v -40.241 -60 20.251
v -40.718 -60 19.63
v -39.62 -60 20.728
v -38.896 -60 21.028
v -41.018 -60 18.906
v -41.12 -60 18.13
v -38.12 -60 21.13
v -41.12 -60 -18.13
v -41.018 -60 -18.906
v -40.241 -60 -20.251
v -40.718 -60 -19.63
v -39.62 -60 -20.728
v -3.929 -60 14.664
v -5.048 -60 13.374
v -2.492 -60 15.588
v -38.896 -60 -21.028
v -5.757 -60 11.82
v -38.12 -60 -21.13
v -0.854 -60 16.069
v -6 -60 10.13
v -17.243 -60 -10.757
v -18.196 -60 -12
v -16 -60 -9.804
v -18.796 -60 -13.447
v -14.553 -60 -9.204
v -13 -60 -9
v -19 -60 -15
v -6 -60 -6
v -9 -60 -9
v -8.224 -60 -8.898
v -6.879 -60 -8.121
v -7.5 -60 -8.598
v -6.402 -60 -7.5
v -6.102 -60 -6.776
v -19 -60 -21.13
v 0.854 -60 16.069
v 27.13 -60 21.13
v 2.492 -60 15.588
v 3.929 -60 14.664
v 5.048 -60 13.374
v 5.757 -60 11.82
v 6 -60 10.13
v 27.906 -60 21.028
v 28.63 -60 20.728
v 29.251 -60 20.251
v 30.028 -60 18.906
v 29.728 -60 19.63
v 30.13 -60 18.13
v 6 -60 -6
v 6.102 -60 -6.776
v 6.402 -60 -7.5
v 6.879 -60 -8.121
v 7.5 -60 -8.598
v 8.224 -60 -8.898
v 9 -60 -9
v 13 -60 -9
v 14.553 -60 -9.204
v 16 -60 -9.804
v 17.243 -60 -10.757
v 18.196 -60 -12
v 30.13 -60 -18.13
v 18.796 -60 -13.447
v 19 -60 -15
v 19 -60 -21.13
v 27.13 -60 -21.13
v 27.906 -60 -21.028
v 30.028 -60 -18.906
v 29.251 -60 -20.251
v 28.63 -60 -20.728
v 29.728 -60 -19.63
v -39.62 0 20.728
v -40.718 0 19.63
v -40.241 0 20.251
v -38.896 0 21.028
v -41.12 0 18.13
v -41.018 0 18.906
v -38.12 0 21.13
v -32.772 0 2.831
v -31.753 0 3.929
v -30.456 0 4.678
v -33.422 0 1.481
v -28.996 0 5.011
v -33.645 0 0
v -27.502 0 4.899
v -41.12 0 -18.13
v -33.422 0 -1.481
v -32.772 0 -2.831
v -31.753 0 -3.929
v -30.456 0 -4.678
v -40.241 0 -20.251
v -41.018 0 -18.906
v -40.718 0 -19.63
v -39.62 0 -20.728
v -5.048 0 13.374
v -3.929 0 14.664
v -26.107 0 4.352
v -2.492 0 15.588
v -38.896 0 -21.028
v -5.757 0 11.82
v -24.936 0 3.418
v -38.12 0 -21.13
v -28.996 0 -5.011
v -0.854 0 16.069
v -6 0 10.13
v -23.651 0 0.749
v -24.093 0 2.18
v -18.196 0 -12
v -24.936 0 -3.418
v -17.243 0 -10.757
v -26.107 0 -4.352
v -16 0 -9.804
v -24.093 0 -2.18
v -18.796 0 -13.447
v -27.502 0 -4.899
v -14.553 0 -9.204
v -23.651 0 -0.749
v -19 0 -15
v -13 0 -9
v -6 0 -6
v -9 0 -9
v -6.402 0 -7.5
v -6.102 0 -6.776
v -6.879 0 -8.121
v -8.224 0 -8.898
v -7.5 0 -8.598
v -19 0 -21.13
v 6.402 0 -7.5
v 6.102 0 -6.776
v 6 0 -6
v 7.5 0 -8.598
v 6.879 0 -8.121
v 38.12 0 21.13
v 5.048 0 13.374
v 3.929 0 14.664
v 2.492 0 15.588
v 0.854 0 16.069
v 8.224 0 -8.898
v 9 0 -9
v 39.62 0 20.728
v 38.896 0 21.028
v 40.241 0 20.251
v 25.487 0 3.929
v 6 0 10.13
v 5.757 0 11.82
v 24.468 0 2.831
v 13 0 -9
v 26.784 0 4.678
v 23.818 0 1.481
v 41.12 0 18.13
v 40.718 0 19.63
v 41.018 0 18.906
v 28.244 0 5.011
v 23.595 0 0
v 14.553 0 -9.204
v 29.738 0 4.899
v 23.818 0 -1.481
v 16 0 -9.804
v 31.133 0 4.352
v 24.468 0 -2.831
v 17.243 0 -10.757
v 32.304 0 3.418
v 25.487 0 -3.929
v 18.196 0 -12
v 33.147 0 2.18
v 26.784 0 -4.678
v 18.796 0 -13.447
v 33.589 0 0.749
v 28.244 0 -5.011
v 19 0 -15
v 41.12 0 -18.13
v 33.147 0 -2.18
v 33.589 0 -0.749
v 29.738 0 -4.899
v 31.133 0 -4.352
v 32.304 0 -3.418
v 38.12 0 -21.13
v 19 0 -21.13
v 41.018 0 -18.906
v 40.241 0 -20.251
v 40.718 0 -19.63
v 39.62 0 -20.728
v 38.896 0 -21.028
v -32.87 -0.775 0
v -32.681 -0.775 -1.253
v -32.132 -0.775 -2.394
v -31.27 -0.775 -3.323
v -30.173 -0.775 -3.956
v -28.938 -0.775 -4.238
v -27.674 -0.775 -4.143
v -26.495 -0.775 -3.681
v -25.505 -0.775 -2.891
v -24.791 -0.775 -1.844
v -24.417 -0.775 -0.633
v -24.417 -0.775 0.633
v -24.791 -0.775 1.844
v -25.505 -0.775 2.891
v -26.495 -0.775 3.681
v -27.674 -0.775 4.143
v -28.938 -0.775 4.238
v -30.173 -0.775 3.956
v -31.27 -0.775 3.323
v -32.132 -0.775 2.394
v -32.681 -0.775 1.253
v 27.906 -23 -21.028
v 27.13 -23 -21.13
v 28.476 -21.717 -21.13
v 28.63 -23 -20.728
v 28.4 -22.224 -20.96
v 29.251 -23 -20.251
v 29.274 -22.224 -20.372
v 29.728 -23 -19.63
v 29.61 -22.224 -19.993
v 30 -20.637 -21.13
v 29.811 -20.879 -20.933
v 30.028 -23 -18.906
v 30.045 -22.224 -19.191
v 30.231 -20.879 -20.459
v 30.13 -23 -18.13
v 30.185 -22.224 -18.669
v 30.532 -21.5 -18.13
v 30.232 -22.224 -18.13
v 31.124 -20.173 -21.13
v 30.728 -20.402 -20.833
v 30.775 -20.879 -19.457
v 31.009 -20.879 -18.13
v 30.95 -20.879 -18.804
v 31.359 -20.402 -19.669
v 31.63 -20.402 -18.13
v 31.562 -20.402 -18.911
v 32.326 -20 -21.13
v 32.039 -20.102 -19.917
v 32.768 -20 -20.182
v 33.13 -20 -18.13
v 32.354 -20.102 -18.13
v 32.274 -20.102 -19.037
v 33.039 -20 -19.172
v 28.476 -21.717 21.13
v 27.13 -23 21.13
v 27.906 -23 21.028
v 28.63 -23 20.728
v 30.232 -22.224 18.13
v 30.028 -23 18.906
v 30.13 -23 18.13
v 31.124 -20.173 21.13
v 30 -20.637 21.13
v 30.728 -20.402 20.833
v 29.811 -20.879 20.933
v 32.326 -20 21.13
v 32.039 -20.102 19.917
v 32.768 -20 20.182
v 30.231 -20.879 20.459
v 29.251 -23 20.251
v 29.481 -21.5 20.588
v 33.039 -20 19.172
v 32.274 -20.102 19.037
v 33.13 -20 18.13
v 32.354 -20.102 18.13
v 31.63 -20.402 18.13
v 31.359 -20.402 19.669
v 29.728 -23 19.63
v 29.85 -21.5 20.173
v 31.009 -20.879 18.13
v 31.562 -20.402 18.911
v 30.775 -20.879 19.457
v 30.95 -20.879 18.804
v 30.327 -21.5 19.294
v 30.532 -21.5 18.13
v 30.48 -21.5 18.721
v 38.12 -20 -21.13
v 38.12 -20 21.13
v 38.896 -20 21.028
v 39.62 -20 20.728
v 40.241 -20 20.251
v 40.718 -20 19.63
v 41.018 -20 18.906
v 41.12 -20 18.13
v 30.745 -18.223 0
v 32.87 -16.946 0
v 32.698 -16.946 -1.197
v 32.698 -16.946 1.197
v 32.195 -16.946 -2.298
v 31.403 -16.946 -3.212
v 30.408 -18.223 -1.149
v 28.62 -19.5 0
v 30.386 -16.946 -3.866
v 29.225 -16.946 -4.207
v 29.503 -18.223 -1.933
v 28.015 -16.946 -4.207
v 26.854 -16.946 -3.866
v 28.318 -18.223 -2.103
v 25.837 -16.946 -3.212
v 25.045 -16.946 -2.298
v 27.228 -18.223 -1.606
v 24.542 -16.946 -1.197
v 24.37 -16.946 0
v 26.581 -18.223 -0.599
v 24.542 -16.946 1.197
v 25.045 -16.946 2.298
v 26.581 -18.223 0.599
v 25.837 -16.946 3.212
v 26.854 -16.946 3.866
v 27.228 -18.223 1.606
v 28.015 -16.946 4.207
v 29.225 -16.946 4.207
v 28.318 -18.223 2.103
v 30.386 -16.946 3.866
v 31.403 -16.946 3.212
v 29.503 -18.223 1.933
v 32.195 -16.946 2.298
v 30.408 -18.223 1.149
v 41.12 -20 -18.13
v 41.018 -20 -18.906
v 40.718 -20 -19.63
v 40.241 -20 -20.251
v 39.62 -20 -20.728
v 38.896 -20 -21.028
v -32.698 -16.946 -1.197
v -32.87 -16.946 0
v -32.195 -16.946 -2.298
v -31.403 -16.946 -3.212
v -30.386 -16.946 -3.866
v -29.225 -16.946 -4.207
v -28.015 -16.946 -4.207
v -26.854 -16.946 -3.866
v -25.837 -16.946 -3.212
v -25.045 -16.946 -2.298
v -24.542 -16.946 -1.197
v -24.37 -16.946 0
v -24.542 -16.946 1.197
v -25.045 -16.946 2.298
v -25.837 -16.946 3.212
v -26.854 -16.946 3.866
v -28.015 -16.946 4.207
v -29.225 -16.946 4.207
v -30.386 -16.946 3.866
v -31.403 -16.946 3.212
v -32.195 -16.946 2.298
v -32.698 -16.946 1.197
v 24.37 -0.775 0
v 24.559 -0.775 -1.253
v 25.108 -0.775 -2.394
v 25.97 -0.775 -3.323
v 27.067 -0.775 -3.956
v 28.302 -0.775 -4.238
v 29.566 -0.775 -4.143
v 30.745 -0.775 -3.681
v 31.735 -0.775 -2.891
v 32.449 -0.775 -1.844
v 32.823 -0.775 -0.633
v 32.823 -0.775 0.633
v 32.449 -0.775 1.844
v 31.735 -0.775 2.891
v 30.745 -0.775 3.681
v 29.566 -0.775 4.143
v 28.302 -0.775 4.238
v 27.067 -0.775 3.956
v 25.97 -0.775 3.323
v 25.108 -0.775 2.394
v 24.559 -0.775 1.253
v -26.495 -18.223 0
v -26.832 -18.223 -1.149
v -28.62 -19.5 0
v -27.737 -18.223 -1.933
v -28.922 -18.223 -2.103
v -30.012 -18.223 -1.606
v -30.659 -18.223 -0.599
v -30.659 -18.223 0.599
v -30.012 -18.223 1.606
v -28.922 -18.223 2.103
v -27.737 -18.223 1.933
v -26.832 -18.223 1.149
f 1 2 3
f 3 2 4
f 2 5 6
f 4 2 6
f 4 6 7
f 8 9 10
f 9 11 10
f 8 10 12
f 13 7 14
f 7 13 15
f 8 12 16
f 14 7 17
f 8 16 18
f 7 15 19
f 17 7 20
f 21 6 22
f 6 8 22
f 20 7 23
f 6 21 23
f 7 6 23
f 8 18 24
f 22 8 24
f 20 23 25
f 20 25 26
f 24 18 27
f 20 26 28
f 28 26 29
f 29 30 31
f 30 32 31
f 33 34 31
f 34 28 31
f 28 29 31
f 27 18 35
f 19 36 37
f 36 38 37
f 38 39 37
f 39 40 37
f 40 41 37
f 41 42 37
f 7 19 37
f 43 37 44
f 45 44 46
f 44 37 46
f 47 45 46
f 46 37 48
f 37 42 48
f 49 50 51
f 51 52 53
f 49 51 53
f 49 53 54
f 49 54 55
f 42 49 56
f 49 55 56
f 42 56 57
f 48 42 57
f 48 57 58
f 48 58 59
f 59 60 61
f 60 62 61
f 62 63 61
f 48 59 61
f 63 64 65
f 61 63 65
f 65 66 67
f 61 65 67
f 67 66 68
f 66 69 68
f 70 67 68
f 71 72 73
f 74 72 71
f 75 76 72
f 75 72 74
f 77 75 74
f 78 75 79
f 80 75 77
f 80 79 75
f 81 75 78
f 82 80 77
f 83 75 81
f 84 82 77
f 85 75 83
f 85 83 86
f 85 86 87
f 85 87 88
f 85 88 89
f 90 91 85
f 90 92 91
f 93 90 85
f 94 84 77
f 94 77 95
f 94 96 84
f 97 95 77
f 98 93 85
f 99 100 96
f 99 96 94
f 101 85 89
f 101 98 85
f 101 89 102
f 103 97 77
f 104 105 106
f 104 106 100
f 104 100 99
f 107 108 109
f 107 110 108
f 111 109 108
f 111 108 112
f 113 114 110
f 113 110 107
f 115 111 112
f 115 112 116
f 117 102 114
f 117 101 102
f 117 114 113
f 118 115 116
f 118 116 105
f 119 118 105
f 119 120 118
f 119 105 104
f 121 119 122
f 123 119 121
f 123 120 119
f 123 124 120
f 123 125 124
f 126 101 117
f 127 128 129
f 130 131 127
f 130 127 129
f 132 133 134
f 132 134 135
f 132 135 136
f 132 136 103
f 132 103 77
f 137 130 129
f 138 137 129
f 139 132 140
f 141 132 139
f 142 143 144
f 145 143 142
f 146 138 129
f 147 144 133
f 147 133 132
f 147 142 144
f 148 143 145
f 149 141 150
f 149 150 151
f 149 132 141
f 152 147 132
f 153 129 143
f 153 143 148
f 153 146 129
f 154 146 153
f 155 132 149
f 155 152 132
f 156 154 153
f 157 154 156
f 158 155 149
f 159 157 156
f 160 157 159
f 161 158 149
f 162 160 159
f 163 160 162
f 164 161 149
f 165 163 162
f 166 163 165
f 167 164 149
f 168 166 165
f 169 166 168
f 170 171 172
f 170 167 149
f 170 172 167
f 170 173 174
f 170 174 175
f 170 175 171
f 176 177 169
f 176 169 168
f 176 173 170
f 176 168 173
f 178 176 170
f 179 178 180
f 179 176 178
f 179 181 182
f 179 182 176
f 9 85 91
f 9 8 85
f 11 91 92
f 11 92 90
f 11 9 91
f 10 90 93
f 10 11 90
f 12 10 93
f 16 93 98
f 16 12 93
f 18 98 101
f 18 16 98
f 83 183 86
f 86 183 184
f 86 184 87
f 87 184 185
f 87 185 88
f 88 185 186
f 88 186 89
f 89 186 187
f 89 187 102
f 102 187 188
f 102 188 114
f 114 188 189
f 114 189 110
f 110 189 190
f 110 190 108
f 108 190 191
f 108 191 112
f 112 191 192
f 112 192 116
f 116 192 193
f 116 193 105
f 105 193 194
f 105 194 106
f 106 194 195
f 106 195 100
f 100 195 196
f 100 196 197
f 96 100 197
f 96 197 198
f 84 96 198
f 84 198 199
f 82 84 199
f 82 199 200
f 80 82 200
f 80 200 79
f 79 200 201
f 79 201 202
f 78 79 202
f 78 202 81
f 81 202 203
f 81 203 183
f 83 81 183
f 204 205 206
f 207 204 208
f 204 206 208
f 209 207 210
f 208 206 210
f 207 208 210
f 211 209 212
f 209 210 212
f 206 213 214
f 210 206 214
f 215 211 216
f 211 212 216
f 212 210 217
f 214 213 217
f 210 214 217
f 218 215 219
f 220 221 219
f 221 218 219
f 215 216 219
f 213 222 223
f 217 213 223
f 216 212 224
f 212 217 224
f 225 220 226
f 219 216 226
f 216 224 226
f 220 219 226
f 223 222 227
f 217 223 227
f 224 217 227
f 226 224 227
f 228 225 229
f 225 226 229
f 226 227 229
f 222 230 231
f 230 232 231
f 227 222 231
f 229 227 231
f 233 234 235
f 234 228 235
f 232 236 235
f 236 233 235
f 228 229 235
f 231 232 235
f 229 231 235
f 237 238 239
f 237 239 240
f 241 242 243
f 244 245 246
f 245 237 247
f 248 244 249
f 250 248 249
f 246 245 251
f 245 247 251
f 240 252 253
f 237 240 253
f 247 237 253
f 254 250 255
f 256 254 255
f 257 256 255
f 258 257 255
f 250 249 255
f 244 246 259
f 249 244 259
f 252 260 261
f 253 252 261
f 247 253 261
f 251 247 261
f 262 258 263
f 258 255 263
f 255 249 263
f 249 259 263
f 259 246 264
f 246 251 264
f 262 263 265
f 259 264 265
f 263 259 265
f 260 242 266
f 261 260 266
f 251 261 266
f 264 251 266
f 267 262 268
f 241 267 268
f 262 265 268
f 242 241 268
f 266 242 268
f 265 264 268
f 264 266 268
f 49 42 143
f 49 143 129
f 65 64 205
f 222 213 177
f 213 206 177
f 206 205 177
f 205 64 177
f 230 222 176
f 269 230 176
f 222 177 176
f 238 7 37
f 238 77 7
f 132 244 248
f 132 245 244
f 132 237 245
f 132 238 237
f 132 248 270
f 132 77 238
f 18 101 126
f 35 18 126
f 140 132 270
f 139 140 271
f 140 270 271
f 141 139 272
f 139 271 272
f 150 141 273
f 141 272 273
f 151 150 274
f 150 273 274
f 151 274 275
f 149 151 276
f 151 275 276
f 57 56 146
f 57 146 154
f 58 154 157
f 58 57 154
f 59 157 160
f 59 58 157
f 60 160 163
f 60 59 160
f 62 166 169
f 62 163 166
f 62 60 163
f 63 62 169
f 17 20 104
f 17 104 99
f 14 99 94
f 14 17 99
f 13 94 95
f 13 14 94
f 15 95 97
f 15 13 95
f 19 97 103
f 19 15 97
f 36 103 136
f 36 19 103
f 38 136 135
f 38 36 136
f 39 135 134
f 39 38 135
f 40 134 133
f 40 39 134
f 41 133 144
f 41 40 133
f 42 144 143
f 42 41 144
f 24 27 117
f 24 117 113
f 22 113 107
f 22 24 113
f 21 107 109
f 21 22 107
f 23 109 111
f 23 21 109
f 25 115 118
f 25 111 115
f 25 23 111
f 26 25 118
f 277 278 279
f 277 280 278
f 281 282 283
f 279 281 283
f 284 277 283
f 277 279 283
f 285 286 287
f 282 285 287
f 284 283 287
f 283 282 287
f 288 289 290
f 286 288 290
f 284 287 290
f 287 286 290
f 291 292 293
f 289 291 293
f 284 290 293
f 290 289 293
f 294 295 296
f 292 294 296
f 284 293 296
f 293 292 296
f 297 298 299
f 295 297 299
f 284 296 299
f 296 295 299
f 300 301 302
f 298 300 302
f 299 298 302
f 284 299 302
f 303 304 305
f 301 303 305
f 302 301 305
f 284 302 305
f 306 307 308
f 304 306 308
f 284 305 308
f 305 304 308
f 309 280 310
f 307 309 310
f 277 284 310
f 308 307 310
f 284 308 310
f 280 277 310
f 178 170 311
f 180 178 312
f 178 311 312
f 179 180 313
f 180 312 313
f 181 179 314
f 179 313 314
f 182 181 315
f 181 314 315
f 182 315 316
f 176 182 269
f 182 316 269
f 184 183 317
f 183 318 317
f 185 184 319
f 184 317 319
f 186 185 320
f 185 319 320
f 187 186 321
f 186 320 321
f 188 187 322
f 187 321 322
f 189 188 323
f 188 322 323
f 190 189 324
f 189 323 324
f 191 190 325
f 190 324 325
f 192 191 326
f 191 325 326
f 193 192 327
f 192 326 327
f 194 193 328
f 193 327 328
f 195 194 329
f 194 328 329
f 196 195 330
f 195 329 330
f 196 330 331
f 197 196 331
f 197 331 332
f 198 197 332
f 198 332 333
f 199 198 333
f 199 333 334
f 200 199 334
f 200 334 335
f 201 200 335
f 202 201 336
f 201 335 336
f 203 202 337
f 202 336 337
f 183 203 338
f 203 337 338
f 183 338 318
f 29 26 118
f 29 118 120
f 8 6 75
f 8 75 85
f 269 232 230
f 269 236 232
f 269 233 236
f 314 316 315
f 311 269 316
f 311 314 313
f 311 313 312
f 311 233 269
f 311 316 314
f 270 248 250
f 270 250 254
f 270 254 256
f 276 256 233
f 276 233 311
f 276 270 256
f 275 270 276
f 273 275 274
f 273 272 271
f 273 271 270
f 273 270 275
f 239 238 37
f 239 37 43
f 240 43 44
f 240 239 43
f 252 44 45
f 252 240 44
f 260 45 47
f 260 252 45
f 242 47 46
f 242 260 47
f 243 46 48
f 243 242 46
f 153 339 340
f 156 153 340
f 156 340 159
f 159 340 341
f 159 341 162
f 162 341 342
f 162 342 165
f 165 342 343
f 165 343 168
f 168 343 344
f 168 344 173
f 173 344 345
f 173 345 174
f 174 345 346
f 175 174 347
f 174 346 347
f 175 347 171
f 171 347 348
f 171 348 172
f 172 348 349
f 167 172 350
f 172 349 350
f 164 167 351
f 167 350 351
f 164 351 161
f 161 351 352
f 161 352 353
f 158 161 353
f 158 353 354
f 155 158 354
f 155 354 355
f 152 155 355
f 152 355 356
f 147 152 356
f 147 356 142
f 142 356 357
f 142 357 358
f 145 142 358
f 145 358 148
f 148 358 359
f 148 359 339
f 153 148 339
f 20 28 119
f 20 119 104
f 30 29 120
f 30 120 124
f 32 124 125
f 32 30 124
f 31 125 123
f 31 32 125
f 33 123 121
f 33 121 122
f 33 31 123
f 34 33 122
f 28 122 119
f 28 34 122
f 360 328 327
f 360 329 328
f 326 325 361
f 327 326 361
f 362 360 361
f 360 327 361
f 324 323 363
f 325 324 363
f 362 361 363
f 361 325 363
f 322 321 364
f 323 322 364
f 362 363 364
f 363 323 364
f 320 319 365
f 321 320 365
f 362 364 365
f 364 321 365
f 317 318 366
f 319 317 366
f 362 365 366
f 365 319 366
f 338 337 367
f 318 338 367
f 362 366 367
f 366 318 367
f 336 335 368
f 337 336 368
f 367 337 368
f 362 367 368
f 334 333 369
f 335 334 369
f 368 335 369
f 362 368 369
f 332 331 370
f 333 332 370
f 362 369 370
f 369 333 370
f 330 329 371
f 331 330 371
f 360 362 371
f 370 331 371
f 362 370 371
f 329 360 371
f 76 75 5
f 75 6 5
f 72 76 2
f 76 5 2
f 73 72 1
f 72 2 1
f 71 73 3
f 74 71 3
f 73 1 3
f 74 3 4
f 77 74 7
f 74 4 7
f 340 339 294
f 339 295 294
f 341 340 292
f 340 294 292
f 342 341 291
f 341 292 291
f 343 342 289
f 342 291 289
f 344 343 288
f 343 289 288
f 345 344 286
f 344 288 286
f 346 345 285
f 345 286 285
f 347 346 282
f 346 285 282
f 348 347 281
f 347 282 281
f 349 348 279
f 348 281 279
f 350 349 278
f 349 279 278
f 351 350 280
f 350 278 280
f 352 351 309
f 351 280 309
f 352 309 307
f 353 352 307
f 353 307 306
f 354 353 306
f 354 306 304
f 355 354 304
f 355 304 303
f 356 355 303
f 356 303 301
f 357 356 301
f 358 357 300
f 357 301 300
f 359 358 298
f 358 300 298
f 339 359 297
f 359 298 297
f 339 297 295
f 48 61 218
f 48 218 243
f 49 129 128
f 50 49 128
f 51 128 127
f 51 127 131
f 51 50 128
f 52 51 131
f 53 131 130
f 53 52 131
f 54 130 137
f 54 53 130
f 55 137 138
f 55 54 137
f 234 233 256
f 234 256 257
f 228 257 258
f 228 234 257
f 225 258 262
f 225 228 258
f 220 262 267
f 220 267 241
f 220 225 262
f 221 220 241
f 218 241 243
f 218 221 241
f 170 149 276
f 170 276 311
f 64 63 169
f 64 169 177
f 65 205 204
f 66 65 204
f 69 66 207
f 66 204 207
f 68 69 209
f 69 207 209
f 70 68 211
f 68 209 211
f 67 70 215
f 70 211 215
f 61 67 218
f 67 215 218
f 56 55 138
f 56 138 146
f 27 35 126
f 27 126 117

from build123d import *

# Parameters (mm, degrees)
SKETCH2_W                    = 82.24
SKETCH2_H                    = 42.26
BOSS_EXTRUDE1_DEPTH          = 60
FILLET1_R                    = 3
SKETCH5_OUTSIDE_W            = 106.284
SKETCH5_OUTSIDE_H            = 66.304
CUT_EXTRUDE2_DEPTH           = 40
CUT_EXTRUDE3_DEPTH           = 76.745173444
FILLET2_R                    = 3
FILLET3_R                    = 3
M10_TAPPED_HOLE1_D           = 8.5
M10_TAPPED_HOLE1_DEPTH       = 16.946342369
M10_TAPPED_HOLE1_CSINK_D     = 10.05
M10_TAPPED_HOLE1_CSINK_ANGLE = 90
M10_TAPPED_HOLE1_TIP         = 2.553657631


with BuildPart() as part:
    # Sketch2 → Boss-Extrude1 (new body)
    with BuildSketch(Plane(origin=(0, 0, 0), x_dir=(1, 0, 0), z_dir=(0, 1, 0))):
        Rectangle(SKETCH2_W, SKETCH2_H)
    extrude(amount=-BOSS_EXTRUDE1_DEPTH)

    # Fillet1
    fillet1_edges = [part.edges().sort_by_distance(p)[0] for p in [
        (41.12, -30, 21.13),
        (-41.12, -30, 21.13),
        (-41.12, -30, -21.13),
        (41.12, -30, -21.13),
    ]]
    fillet(fillet1_edges, radius=FILLET1_R)

    # Sketch5 outside → Cut-Extrude2 (cut)
    with BuildSketch(Plane.XZ.offset(60)):
        Rectangle(SKETCH5_OUTSIDE_W, SKETCH5_OUTSIDE_H)
        with BuildLine():
            Line((19, -21.13), (30.13, -21.13))
            Line((30.13, -21.13), (30.13, 21.13))
            Line((30.13, 21.13), (-41.12, 21.13))
            Line((-41.12, 21.13), (-41.12, -21.13))
            Line((-41.12, -21.13), (-19, -21.13))
            Line((-19, -21.13), (-19, -15))
            ThreePointArc((-19, -15), (-17.242640687, -10.757359313), (-13, -9))
            Line((-13, -9), (-9, -9))
            ThreePointArc((-9, -9), (-6.878679656, -8.121320344), (-6, -6))
            Line((-6, -6), (-6, 10.13))
            ThreePointArc((-6, 10.13), (0, 16.13), (6, 10.13))
            Line((6, 10.13), (6, -6))
            ThreePointArc((6, -6), (6.878679656, -8.121320344), (9, -9))
            Line((9, -9), (13, -9))
            ThreePointArc((13, -9), (17.242640687, -10.757359313), (19, -15))
            Line((19, -15), (19, -21.13))
        make_face(mode=Mode.SUBTRACT)
    extrude(amount=-CUT_EXTRUDE2_DEPTH, mode=Mode.SUBTRACT)

    # Sketch6 → Cut-Extrude3 (cut, through all)
    with BuildSketch(Plane.XZ.offset(60)):
        with BuildLine():
            Line((-13, -9), (-9, -9))
            ThreePointArc((-9, -9), (-6.878679656, -8.121320344), (-6, -6))
            Line((-6, -6), (-6, 10.13))
            ThreePointArc((-6, 10.13), (0, 16.13), (6, 10.13))
            Line((6, 10.13), (6, -6))
            ThreePointArc((6, -6), (6.878679656, -8.121320344), (9, -9))
            Line((9, -9), (13, -9))
            ThreePointArc((13, -9), (17.242640687, -10.757359313), (19, -15))
            Line((19, -15), (19, -21.13))
            Line((19, -21.13), (-19, -21.13))
            Line((-19, -21.13), (-19, -15))
            ThreePointArc((-19, -15), (-17.242640687, -10.757359313), (-13, -9))
        make_face()
    extrude(amount=-CUT_EXTRUDE3_DEPTH, mode=Mode.SUBTRACT)

    # Fillet2
    fillet2_edges = [part.edges().sort_by_distance(p)[0] for p in [
        (30.13, -40, 21.13),
        (30.13, -40, -21.13),
    ]]
    fillet(fillet2_edges, radius=FILLET2_R)

    # Fillet3
    # the kernel refuses this fillet: 3 mm, written as the material it adds along each edge
    with BuildSketch(Plane(origin=(30.13, -20, -18.13), x_dir=(0, -1, 0), z_dir=(0, 0, 1))) as fillet3_piece_1:
        with BuildLine():
            CenterArc((FILLET3_R, FILLET3_R), FILLET3_R, 180, 90)
            Line((0, FILLET3_R), (0, 0))
            Line((0, 0), (FILLET3_R, 0))
        make_face()
    extrude(amount=36.26)
    with BuildSketch(Plane(origin=(27.13, -20, 18.13), x_dir=(-0.5976672776328266, 0, -0.801744239297649), z_dir=(0.801744239297649, 0, -0.5976672776328266))) as fillet3_piece_2_section:
        with BuildLine():
            CenterArc((3 + FILLET3_R, -FILLET3_R), FILLET3_R, 90, 90)
            Line((3, -FILLET3_R), (3, 0))
            Line((3, 0), (3 + FILLET3_R, 0))
        make_face()
    fillet3_piece_2 = revolve(axis=Axis((27.13, -20, 18.13), (0, 1, 0)), revolution_arc=233.296989237, mode=Mode.PRIVATE)
    fillet3_piece_2 = split(fillet3_piece_2, bisect_by=Plane(origin=(29.379816868, -20.934884818, 21.13), z_dir=(0, 0, -1)), keep=Keep.TOP, mode=Mode.PRIVATE)
    add(fillet3_piece_2)
    with BuildSketch(Plane(origin=(27.13, -20, -18.13), x_dir=(-0.5976672776328287, 0, 0.8017442392976475), z_dir=(0.8017442392976475, 0, 0.5976672776328287))) as fillet3_piece_3_section:
        with BuildLine():
            CenterArc((3 + FILLET3_R, FILLET3_R), FILLET3_R, 180, 90)
            Line((3 + FILLET3_R, 0), (3, 0))
            Line((3, 0), (3, FILLET3_R))
        make_face()
    fillet3_piece_3 = revolve(axis=Axis((27.13, -20, -18.13), (0, -1, 0)), revolution_arc=233.296989237, mode=Mode.PRIVATE)
    fillet3_piece_3 = split(fillet3_piece_3, bisect_by=Plane(origin=(29.379816762, -20.934885263, -21.13), z_dir=(0, 0, 1)), keep=Keep.TOP, mode=Mode.PRIVATE)
    add(fillet3_piece_3)

    # M10 Tapped Hole1
    with Locations(Plane(origin=(0, 0, 0), x_dir=(1, 0, 0), z_dir=(0, 1, 0))):
        with Locations((28.62, 0), (-28.62, 0)):
            CounterSinkHole(M10_TAPPED_HOLE1_D / 2, M10_TAPPED_HOLE1_CSINK_D / 2, depth=M10_TAPPED_HOLE1_DEPTH, counter_sink_angle=M10_TAPPED_HOLE1_CSINK_ANGLE)
            with Locations((0, 0, -(M10_TAPPED_HOLE1_DEPTH + M10_TAPPED_HOLE1_TIP / 2))):  # 118° drill point
                Cone(0, M10_TAPPED_HOLE1_D / 2, M10_TAPPED_HOLE1_TIP, mode=Mode.SUBTRACT)


solid = part.part
